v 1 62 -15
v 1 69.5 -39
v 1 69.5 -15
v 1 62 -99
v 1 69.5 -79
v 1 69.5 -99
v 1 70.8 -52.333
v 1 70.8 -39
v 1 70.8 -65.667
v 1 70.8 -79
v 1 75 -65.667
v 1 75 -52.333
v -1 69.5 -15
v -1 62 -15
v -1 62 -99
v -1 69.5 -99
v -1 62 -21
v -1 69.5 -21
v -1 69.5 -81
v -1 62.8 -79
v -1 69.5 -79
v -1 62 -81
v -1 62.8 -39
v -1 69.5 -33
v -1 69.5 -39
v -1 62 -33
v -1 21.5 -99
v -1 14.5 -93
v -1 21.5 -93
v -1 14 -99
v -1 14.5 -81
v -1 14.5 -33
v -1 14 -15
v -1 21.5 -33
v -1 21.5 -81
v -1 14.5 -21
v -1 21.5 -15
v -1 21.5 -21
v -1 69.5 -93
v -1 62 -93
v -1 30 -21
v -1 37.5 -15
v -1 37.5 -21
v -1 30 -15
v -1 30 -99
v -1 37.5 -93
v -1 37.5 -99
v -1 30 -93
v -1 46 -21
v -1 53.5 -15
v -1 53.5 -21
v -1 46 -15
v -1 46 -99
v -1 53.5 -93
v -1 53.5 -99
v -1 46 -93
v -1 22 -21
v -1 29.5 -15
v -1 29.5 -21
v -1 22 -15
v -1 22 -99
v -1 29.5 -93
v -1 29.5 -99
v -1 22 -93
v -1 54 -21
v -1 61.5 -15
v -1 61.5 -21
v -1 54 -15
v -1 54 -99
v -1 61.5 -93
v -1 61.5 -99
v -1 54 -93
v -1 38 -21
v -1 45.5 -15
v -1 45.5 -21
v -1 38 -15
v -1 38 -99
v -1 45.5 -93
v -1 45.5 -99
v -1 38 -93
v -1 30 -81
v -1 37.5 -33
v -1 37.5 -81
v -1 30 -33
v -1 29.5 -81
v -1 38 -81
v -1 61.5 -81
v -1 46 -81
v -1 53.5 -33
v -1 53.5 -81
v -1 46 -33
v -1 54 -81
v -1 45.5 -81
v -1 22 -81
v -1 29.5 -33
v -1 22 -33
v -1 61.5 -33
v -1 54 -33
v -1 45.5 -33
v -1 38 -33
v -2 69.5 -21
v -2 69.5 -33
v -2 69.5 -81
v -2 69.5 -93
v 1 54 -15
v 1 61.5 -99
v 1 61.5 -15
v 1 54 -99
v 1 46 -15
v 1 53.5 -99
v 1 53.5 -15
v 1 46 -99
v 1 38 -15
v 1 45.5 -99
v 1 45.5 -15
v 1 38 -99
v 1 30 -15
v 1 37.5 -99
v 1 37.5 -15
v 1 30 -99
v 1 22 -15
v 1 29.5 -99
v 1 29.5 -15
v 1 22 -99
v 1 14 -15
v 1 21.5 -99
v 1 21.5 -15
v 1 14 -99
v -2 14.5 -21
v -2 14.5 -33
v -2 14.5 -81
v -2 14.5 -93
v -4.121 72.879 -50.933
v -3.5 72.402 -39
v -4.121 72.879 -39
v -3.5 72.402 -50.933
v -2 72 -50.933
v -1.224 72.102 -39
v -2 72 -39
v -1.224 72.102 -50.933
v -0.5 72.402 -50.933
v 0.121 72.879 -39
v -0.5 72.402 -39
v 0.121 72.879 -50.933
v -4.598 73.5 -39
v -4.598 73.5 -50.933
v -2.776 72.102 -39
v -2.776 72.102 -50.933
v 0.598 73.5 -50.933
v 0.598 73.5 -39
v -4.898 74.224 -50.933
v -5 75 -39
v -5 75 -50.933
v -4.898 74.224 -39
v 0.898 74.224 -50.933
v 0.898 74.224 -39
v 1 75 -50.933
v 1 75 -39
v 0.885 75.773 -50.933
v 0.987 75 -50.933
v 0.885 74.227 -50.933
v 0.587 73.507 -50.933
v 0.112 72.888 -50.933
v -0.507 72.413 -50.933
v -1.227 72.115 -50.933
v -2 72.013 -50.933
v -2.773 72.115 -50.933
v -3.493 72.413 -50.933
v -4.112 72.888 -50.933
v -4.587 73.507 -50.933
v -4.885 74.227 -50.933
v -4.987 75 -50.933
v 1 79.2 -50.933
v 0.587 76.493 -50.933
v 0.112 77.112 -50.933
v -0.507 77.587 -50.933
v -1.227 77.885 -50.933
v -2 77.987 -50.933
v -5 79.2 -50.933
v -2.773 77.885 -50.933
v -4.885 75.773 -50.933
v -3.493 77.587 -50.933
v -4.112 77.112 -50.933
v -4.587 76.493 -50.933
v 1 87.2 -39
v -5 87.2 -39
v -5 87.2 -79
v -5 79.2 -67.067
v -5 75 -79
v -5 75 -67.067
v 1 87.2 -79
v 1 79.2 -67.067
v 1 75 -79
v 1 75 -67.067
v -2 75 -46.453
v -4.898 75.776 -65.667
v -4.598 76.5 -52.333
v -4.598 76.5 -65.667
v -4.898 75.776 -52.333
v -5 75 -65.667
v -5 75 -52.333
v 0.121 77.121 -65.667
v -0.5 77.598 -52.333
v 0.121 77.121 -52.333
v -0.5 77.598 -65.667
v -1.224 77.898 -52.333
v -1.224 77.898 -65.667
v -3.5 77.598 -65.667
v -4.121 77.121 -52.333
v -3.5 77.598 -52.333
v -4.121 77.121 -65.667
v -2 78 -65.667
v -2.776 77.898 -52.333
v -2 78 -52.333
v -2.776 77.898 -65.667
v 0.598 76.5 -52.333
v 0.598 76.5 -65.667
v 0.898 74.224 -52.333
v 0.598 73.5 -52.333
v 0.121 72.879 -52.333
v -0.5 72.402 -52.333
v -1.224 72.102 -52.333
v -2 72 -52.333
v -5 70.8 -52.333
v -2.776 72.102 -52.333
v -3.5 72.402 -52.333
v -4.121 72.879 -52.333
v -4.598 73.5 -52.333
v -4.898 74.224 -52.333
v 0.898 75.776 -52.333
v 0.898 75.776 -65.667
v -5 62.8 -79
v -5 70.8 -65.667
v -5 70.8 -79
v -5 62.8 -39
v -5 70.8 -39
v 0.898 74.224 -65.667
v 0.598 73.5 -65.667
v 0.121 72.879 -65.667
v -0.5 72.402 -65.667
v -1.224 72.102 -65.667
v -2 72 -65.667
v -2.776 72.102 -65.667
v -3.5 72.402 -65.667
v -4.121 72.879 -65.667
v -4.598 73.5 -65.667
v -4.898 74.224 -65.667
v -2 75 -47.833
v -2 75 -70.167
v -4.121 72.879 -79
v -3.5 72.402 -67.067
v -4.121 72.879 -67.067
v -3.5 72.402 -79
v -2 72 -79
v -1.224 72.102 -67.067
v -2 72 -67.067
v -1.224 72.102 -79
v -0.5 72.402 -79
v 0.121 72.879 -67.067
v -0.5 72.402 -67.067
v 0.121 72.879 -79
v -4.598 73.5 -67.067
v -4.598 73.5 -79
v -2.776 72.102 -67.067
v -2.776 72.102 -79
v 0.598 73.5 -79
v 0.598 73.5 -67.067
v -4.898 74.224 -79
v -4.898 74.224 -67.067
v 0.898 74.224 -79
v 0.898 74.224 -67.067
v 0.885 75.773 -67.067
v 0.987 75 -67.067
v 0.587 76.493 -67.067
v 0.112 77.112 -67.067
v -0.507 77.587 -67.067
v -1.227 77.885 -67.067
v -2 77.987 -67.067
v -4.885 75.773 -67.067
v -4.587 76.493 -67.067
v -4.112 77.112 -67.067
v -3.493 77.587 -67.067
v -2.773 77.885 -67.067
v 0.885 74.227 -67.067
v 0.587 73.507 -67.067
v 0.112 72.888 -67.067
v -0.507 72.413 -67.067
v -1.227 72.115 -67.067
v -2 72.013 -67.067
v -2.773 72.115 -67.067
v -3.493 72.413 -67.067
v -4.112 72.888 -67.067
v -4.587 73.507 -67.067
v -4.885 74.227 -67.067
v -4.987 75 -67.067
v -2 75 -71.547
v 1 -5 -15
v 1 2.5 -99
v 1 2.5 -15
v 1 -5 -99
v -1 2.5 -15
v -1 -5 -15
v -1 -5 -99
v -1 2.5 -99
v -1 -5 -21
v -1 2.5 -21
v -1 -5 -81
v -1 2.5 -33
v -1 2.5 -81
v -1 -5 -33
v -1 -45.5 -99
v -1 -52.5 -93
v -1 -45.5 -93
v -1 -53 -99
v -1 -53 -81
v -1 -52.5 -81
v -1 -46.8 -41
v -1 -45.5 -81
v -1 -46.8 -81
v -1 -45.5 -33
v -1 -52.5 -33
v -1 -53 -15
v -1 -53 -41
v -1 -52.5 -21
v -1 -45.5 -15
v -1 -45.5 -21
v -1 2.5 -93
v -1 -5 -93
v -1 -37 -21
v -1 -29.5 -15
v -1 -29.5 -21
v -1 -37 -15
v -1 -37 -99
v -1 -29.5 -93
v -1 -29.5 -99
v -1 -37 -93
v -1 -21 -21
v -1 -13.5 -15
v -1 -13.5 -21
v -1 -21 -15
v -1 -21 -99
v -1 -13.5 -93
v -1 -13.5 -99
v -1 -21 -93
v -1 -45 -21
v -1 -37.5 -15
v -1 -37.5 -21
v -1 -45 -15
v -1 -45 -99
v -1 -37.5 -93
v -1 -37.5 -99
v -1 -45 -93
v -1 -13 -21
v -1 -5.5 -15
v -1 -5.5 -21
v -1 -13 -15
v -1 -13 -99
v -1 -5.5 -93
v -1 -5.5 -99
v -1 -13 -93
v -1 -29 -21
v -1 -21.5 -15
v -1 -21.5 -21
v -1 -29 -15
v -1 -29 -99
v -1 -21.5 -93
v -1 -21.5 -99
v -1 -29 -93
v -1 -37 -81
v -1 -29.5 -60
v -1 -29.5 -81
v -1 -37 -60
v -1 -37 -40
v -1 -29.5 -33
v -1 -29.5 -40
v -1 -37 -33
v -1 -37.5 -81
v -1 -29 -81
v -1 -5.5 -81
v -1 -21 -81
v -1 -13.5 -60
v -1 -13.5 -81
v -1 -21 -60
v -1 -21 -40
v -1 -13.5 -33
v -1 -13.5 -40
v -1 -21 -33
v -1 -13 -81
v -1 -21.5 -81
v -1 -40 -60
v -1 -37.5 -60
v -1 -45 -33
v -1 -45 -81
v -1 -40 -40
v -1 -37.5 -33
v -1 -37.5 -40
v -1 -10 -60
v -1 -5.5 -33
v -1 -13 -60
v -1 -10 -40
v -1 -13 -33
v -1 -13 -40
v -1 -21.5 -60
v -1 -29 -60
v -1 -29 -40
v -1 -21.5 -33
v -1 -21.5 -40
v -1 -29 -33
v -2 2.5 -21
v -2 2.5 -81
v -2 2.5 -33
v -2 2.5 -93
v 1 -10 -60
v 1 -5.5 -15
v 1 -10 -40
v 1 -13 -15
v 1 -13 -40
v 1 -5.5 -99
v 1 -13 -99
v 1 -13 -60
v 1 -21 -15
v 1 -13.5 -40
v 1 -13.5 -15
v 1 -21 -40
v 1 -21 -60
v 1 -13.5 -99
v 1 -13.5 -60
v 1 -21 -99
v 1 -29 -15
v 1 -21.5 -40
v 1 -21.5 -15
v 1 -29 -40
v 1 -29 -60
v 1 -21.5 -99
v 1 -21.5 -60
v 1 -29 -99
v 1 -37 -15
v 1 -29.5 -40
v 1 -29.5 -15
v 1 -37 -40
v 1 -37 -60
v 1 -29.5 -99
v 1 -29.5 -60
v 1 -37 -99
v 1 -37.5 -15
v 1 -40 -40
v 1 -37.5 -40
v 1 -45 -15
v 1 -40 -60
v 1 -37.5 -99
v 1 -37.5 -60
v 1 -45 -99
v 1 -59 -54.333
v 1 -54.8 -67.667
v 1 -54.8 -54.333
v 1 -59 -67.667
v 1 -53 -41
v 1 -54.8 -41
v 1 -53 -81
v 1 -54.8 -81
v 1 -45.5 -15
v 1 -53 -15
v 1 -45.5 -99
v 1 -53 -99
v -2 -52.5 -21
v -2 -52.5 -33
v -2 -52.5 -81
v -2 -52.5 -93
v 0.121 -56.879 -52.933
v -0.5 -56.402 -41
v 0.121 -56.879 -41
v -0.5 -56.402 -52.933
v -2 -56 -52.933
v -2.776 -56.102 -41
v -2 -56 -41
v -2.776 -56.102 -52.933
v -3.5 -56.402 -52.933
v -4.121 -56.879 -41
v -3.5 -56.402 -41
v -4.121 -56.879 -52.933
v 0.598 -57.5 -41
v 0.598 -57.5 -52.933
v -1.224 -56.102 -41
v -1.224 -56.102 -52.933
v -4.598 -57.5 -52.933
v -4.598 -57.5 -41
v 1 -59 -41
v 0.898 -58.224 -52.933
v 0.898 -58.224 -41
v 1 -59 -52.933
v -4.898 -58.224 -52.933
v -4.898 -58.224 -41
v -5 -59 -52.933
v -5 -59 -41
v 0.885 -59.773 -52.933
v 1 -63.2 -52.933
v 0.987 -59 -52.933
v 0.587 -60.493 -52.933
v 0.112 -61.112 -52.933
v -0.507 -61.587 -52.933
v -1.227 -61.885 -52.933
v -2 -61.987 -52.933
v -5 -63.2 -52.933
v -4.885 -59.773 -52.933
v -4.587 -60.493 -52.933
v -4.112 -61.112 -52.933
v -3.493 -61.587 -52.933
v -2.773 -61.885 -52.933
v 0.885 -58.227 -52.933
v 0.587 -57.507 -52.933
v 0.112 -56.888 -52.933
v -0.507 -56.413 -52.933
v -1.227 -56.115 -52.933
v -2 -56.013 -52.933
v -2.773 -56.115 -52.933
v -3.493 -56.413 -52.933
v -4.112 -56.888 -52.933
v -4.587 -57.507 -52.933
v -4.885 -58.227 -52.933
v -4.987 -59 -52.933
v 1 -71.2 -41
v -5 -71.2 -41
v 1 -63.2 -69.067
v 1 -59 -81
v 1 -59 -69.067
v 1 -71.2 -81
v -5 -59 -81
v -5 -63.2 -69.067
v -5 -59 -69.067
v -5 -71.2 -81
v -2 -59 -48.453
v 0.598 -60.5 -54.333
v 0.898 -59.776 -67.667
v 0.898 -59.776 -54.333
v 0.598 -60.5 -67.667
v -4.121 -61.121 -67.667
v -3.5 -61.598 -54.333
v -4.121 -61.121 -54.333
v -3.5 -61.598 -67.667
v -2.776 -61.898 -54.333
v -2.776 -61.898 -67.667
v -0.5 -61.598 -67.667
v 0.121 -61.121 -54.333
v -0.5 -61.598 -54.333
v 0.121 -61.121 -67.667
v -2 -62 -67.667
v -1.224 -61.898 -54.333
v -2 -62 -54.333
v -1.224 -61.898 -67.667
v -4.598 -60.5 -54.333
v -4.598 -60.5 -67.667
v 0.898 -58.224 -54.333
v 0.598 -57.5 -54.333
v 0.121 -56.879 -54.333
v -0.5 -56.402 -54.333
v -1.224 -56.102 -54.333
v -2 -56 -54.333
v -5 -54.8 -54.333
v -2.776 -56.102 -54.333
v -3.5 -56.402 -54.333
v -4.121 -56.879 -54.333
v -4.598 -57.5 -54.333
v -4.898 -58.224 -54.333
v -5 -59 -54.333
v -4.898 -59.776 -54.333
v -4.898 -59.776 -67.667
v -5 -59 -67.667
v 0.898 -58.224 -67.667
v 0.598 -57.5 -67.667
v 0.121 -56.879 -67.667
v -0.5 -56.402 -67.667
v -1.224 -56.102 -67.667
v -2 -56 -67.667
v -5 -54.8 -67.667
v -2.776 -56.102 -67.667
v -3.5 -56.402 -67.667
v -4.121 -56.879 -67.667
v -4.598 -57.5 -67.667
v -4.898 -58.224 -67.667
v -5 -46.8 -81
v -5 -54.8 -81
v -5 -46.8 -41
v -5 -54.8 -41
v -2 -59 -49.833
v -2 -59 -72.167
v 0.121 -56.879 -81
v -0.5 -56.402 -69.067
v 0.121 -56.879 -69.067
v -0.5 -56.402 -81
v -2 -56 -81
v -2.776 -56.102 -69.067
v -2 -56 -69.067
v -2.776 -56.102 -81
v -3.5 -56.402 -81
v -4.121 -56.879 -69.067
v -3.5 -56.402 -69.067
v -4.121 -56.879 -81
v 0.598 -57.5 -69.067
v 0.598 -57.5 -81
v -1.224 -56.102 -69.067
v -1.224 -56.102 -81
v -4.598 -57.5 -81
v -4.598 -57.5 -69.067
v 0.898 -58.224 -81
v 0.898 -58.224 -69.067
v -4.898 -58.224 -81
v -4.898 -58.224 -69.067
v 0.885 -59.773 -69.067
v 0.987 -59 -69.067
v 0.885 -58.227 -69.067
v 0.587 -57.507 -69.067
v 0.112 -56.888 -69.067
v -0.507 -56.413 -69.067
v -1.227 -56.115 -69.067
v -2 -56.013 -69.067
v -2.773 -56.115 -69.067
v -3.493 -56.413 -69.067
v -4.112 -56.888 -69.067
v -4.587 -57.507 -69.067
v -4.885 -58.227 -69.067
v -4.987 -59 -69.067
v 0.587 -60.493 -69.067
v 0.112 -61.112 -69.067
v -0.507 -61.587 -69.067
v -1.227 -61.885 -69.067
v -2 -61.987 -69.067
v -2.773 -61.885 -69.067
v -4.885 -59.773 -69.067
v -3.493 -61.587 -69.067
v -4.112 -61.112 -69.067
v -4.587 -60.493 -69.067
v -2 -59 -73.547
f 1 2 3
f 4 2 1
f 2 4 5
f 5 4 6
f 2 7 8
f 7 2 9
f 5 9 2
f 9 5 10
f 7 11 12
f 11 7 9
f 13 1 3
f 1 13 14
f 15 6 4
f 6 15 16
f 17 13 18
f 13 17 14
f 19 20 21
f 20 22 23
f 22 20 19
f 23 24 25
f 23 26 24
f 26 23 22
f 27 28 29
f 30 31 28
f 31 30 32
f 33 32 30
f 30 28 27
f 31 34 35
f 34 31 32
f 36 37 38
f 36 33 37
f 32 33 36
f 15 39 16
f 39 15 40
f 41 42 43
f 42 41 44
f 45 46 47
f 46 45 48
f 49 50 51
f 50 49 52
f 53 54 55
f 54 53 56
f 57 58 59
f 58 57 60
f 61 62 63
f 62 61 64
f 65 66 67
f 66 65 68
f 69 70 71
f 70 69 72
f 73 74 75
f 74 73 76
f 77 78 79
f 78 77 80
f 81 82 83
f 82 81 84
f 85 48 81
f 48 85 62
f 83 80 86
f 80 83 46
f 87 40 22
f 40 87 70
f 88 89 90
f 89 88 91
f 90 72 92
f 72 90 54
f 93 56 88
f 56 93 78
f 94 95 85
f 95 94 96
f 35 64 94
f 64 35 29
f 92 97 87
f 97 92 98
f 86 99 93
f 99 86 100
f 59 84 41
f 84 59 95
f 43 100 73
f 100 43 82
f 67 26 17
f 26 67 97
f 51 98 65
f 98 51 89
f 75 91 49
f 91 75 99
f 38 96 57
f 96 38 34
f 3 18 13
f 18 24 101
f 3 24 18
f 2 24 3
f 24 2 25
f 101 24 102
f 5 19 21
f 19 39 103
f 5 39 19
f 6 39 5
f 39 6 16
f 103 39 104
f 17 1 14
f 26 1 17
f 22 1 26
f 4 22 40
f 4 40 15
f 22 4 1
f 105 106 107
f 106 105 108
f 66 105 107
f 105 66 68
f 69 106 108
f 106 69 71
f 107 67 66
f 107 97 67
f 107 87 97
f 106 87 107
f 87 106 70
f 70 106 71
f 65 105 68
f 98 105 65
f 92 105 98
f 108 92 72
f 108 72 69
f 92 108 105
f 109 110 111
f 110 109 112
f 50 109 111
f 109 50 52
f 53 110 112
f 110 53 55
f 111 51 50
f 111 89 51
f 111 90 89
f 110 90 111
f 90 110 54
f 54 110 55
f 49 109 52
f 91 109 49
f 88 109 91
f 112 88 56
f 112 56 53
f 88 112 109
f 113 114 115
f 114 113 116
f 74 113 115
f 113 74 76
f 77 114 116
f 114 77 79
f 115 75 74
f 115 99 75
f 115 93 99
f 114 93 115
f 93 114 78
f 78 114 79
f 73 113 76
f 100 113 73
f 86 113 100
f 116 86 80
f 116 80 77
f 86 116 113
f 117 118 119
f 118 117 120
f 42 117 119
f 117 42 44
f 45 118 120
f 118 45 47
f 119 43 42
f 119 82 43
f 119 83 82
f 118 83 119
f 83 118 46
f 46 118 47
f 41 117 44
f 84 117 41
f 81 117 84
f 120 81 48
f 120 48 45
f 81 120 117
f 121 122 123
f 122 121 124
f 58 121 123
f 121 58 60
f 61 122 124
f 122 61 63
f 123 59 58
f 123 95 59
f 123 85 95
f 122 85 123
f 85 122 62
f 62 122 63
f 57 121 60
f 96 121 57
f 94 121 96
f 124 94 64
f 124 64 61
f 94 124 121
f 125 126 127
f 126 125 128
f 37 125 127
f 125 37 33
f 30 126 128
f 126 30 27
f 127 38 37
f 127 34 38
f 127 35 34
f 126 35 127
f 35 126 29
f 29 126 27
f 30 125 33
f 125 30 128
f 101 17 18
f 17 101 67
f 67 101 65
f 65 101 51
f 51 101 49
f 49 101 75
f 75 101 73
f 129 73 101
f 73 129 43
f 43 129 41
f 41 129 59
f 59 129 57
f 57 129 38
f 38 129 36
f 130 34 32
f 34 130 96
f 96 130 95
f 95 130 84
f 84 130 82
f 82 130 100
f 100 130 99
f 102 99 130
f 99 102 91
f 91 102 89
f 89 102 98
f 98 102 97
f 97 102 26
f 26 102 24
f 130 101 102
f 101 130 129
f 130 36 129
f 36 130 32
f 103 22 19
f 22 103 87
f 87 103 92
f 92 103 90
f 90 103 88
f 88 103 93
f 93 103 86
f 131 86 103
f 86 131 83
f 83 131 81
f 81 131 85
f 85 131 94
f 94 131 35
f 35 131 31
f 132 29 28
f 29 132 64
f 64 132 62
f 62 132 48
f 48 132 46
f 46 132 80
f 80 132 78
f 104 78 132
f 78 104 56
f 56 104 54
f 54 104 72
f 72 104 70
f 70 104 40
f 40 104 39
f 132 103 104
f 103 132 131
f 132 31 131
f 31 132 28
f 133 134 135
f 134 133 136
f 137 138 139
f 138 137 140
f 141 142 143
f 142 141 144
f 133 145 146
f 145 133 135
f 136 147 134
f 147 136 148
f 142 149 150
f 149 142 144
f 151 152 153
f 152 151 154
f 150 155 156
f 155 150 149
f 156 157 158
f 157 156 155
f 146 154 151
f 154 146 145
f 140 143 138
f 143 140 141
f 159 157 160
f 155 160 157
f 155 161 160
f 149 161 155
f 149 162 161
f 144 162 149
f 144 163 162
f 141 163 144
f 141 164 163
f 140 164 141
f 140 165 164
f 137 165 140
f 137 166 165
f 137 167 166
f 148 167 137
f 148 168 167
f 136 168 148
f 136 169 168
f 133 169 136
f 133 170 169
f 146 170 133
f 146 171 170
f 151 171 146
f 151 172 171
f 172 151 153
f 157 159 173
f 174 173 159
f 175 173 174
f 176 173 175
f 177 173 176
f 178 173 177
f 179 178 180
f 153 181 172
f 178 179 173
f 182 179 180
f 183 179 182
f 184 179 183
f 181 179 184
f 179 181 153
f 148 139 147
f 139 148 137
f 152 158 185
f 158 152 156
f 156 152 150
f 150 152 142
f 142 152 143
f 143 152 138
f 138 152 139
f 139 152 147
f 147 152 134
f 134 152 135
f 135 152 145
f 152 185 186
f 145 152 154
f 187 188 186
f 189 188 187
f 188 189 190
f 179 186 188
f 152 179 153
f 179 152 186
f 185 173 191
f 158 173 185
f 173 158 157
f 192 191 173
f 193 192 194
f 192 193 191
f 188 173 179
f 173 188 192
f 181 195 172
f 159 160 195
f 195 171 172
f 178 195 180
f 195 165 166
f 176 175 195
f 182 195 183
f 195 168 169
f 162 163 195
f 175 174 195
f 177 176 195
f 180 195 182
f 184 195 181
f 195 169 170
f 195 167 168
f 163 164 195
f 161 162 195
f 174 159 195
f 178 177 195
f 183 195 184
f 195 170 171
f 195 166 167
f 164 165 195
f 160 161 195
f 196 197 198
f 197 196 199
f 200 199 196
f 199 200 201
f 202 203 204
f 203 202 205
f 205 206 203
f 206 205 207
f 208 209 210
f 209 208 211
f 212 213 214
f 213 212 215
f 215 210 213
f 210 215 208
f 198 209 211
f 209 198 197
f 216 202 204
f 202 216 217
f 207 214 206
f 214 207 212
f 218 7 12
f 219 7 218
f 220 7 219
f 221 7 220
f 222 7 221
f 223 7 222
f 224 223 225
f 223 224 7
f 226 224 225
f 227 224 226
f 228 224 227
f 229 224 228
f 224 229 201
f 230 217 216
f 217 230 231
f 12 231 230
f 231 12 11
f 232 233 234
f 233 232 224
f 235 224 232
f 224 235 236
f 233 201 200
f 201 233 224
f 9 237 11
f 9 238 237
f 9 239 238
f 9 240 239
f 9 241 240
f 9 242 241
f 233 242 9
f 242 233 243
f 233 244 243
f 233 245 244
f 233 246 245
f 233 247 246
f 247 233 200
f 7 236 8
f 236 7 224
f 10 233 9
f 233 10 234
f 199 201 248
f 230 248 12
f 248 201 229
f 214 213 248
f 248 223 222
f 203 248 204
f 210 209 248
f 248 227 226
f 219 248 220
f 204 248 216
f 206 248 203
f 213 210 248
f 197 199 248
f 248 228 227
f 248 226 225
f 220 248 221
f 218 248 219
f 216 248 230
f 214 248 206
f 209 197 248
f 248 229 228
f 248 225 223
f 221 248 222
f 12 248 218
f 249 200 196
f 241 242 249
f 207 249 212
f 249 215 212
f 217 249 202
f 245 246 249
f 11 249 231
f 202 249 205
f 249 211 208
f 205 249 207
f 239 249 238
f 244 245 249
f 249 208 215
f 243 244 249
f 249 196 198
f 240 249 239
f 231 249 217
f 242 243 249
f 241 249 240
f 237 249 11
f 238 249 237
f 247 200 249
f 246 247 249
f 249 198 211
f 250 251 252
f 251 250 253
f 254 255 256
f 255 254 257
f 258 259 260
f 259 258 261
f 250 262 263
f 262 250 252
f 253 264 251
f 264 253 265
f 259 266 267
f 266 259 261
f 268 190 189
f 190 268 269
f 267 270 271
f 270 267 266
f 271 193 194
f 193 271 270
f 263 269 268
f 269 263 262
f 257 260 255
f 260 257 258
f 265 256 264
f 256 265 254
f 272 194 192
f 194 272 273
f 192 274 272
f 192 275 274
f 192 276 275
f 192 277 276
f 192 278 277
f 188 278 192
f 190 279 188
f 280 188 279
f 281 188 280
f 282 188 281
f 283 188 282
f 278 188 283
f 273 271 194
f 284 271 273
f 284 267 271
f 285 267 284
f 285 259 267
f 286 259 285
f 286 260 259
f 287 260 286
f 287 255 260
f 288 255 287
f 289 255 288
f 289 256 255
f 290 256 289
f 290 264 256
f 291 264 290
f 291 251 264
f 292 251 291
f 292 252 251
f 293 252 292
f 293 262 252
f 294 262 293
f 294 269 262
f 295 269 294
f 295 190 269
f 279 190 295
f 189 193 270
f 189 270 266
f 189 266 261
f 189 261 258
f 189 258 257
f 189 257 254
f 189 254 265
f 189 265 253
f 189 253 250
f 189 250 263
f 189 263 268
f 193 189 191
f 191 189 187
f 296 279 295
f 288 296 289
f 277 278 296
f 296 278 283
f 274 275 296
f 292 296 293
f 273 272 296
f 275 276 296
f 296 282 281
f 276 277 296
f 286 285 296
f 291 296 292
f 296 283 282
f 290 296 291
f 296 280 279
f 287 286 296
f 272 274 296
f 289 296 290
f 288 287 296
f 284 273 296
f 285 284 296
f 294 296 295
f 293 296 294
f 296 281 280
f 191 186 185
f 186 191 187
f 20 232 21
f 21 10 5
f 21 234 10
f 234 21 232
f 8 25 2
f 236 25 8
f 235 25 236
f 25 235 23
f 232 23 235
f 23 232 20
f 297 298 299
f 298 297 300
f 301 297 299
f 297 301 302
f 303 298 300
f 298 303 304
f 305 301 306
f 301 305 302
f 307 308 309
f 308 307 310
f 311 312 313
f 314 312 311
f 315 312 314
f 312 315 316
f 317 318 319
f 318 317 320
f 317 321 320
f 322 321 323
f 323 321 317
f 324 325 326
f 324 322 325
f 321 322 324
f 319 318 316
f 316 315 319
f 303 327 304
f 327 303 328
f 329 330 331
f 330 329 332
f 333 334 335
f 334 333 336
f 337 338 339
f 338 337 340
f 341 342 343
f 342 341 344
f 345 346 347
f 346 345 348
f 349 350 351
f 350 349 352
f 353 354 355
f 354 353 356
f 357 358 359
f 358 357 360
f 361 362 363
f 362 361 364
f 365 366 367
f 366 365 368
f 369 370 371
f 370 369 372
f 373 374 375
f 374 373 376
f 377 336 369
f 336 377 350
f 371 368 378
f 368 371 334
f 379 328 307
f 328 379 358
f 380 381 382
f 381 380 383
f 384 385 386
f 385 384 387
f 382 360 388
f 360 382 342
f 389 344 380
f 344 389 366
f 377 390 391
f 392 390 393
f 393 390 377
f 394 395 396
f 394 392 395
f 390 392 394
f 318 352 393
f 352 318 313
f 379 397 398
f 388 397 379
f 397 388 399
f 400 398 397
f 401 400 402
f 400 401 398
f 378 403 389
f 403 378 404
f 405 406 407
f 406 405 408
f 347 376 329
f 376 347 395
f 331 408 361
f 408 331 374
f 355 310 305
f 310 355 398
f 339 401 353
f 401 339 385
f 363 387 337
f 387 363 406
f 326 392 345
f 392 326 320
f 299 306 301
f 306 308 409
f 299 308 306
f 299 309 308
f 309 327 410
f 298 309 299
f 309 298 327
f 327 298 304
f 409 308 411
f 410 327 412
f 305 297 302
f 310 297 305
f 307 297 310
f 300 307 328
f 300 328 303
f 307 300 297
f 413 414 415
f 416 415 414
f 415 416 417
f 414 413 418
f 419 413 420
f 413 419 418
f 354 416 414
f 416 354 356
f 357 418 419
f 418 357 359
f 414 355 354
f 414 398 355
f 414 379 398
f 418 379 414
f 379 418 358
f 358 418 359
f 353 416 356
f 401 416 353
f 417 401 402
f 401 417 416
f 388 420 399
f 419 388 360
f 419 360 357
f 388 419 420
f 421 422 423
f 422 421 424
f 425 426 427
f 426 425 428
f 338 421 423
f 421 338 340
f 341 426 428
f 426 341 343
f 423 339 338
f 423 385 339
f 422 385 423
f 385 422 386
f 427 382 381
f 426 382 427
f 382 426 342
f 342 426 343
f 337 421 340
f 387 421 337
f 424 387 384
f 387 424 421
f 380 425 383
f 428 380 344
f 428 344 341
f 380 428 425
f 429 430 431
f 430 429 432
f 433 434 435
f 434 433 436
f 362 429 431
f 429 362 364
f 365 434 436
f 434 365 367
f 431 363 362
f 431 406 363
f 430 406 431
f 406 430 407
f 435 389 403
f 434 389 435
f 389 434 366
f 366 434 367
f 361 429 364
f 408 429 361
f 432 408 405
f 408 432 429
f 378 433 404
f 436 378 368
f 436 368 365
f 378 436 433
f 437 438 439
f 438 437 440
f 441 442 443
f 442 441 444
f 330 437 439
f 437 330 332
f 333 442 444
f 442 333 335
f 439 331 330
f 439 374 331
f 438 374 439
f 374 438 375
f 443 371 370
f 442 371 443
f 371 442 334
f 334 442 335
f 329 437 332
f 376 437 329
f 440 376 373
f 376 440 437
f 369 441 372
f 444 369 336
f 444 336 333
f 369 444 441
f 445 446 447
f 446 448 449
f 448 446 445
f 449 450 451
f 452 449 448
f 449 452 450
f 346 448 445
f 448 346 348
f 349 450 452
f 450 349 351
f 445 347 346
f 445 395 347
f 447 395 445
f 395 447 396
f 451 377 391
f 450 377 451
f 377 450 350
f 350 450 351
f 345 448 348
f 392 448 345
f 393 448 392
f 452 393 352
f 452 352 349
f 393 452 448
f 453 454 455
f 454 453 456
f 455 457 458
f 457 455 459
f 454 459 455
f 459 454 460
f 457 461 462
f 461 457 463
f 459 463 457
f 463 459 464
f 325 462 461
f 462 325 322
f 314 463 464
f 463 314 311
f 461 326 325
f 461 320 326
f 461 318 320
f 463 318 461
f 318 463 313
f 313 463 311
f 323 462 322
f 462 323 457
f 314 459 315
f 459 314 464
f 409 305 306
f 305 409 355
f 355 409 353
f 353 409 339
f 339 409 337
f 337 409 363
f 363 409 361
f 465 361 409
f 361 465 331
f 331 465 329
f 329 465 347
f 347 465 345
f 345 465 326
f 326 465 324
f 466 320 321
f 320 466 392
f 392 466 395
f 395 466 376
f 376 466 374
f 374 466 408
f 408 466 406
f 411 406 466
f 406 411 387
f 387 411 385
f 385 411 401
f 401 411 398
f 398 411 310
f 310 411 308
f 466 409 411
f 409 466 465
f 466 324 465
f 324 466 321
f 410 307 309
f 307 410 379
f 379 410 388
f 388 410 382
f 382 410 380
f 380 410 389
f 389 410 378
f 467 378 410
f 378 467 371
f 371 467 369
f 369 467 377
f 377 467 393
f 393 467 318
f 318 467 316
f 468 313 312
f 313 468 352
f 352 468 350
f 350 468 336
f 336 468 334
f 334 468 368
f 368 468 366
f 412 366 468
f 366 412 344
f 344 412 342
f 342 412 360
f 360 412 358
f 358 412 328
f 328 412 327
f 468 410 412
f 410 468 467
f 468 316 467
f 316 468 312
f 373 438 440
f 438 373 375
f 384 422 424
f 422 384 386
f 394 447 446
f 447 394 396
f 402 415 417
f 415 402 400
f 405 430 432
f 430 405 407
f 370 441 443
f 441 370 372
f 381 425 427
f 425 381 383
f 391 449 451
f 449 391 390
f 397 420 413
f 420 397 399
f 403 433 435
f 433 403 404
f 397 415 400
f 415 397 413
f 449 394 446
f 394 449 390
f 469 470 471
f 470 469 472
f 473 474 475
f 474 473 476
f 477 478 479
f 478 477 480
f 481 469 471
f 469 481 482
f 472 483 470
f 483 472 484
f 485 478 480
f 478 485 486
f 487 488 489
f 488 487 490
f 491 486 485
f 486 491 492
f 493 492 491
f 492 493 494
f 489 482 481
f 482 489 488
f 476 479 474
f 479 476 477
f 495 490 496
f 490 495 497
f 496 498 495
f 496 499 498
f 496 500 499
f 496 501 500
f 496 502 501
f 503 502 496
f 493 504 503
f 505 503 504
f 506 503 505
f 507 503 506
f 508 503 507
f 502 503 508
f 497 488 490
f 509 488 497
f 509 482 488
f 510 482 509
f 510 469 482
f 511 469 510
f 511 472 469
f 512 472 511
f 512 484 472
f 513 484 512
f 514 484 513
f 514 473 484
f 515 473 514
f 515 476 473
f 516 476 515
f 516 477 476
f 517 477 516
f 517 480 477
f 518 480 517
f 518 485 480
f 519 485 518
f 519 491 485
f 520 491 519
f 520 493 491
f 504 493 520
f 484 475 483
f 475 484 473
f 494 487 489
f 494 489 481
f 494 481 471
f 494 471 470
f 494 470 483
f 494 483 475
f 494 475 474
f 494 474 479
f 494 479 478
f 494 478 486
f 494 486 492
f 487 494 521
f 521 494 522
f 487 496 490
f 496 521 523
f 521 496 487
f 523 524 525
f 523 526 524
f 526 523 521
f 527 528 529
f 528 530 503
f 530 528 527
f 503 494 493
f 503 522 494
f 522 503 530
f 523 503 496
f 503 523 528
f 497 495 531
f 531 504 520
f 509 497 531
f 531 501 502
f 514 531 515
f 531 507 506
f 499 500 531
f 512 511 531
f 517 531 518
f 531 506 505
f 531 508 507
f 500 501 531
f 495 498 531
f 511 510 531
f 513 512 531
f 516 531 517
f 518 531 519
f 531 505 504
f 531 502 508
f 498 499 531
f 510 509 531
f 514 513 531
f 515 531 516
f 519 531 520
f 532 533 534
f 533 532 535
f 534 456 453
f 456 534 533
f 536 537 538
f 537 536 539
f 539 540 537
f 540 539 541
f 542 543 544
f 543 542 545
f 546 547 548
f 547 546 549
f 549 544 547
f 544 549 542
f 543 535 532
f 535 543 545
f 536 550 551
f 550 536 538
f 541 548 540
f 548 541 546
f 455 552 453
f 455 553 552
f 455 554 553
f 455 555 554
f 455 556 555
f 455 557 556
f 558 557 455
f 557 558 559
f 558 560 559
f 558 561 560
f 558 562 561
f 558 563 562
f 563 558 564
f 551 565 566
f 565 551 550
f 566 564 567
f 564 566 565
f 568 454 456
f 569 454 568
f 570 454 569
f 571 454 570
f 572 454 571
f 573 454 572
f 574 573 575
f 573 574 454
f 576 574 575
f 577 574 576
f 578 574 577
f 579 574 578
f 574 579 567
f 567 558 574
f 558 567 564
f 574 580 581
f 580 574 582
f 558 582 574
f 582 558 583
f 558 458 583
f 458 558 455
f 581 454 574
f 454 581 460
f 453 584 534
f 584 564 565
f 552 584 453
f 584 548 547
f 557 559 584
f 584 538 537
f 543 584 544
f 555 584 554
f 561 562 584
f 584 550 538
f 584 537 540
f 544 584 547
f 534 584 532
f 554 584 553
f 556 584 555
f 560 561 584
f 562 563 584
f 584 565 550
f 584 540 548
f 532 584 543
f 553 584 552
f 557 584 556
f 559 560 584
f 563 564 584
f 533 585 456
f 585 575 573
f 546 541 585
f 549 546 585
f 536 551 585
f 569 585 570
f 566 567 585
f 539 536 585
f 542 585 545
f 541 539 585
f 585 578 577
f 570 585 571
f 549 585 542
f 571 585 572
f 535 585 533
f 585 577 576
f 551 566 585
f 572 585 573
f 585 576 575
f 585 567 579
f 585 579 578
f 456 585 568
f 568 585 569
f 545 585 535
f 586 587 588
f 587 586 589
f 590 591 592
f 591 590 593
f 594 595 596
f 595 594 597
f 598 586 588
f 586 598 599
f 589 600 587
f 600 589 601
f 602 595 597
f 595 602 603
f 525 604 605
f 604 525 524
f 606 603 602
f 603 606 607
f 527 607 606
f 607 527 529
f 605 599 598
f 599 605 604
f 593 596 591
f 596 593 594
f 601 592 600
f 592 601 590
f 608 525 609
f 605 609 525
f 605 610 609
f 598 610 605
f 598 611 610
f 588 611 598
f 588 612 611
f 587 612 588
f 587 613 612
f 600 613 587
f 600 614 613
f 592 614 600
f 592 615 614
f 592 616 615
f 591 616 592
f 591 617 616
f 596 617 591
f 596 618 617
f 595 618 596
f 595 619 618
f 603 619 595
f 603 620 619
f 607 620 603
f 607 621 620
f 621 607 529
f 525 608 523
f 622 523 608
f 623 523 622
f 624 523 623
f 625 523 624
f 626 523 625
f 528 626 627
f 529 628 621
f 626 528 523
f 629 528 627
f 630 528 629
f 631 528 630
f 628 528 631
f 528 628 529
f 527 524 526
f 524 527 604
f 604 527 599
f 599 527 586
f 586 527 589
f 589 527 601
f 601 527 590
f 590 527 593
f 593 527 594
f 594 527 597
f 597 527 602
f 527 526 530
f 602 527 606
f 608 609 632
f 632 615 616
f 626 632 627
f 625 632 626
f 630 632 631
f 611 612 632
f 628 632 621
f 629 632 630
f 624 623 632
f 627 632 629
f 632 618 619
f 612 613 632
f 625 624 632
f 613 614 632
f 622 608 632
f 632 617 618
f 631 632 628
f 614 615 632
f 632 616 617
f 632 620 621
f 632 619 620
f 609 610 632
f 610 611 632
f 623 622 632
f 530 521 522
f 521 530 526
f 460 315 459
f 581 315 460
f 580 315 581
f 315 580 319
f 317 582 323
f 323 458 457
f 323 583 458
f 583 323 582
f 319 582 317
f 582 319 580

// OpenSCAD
// file: ../SCAD/mathhinge.scad
module math_hinge(){// mathgrrl cone hinge

//////////////////////////////////////////////////////
// parameters

// Length of the complete hinge
length = 20;

// Height (diameter) of the hinge
height = 3;

// Clearance between cones and holes
clearance = .7;		

// Clearance between hinge and sides
gap = .6; 				

// Parameters that the user does not get to specify
$fn=24*1;
border = 2*1; 
fudge = .01*1;			// to preserve mesh integrity
corner = 0*1;      	// space between hinge and corner
hinge_radius = height/2;
cone_height = 1.5*hinge_radius;  

//////////////////////////////////////////////////////
// renders

rotate(90,[0,1,0]) 
	translate([-hinge_radius,0,0])
		hinge();

translate([0,hinge_radius+gap,0]) bar();
translate([0,-2*border-hinge_radius-gap,0]) bar();

//translate([0,hinge_radius+gap,0]) square();
//translate([0,-length-hinge_radius-gap,0]) square();


//////////////////////////////////////////////////////
// module for hinge

module hinge(){
	rad = hinge_radius;
	clr = clearance;
	len = (length-2*corner)/3; 
	con = cone_height;
	// left outside hinge = (cylinder+box)-cone
	difference(){
		union(){
			translate([0,0,corner]) cylinder(h=len-clr,r=rad);
			translate([-rad,0,corner]) cube([2*rad,rad+gap,len-clr]);
		}
		translate([0,0,corner+len-con-clr+fudge]) cylinder(h=con,r1=0,r2=rad);
	}
	// inside hinge = cylinder+box+cone+cone
	union(){
		translate([0,0,corner+len]) cylinder(h=len,r=rad);
		translate([-rad,-rad-gap,corner+len]) cube([2*rad,rad+gap,len]);
		translate([0,0,corner+len-con]) cylinder(h=con,r1=0,r2=rad);
		translate([0,0,corner+2*len]) cylinder(h=con,r1=rad,r2=0);
	}
	// right outside hinge = (cylinder+box)-cone
	difference(){
		union(){
			translate([0,0,corner+2*len+clr]) cylinder(h=len-clr,r=rad);
			translate([-rad,0,corner+2*len+clr]) cube([2*rad,rad+gap,len-clr]);
		}
		translate([0,0,corner+2*len+clr-fudge]) cylinder(h=con,r1=rad,r2=0);	
	}
}

//////////////////////////////////////////////////////
// module for square shape

module square(){
	difference(){
		cube([length,length,height]);
		translate([border,border,-fudge])
			cube(	[length-2*border,length-2*border,height+2*fudge]);
	}
}

//////////////////////////////////////////////////////
// module for bar shape

module bar(){
	cube([length,2*border,height]);
}
}
math_hinge();
// file: ../SCAD/fence.scad
module fence(){

	for(i= [0:6])
	{
		translate([-15, 50-16*i, 5])
			cube([2, 15, 70]);
	}
	translate([-16, -45, 60])
		cube([1, 110, 10]);

	translate([-16, -45, 10])
		cube([1, 110, 10]);
}

fence();
// file: ../SCAD/hinge-lego.scad
use <mathhinge.scad>;

module hinge(){
translate([1, -10, 0]) scale([2,2,2]) math_hinge();
}

module box(){
	difference(){
		cube([44, 10, 6], center=true);
		translate([0,0,2]) cube([42, 8, 6], center=true);
	}
}


translate([0, -11, 0]) hinge();
translate([21,-3,2]) box();

//for comparison
//translate([0, -5, 0]) cube([20, 4, 3]);
// main file
use <../SCAD/hinge-lego.scad>;
use <../SCAD/fence.scad>;

module monkey(factor){
	difference(){
		//http://www.thingiverse.com/thing:182232
		scale([factor*0.7, factor, factor])
		import("../SCAD/component/Monkey_t.stl");
		translate([0, -50, -10]) cube([200, 200, 200]);
	}
}

//right door
module right_door(){
	rotate([0, 0, 90]) translate([68, 32, -5]) scale([1, .5, 1.2])
		fence();
	translate([-80, 49, 62]) rotate([270, 90, 0])
		hinge();
}

//left door
module left_door(){
	difference(){
		scale([1, .5, 1.2])
			fence();
		translate([-20, -10, 45]) //window
			cube([15, 30, 20]);
	}
	translate([-13, -39, 65]) rotate([180, 90, 0])
		hinge();
}

translate([-54, 5, -100]) rotate([0, 0, 270]) right_door();
translate([14, -30, -105]) left_door();

/*
translate([0, 0, 5]) monkey(1.2);


//base
translate([0, -70, -10])cube([1, 150, 100]);

rotate([0, 270, 0]) {
	translate([40, 65, 2]) box();
	translate([40, -53, 2]) box();
}
*/
